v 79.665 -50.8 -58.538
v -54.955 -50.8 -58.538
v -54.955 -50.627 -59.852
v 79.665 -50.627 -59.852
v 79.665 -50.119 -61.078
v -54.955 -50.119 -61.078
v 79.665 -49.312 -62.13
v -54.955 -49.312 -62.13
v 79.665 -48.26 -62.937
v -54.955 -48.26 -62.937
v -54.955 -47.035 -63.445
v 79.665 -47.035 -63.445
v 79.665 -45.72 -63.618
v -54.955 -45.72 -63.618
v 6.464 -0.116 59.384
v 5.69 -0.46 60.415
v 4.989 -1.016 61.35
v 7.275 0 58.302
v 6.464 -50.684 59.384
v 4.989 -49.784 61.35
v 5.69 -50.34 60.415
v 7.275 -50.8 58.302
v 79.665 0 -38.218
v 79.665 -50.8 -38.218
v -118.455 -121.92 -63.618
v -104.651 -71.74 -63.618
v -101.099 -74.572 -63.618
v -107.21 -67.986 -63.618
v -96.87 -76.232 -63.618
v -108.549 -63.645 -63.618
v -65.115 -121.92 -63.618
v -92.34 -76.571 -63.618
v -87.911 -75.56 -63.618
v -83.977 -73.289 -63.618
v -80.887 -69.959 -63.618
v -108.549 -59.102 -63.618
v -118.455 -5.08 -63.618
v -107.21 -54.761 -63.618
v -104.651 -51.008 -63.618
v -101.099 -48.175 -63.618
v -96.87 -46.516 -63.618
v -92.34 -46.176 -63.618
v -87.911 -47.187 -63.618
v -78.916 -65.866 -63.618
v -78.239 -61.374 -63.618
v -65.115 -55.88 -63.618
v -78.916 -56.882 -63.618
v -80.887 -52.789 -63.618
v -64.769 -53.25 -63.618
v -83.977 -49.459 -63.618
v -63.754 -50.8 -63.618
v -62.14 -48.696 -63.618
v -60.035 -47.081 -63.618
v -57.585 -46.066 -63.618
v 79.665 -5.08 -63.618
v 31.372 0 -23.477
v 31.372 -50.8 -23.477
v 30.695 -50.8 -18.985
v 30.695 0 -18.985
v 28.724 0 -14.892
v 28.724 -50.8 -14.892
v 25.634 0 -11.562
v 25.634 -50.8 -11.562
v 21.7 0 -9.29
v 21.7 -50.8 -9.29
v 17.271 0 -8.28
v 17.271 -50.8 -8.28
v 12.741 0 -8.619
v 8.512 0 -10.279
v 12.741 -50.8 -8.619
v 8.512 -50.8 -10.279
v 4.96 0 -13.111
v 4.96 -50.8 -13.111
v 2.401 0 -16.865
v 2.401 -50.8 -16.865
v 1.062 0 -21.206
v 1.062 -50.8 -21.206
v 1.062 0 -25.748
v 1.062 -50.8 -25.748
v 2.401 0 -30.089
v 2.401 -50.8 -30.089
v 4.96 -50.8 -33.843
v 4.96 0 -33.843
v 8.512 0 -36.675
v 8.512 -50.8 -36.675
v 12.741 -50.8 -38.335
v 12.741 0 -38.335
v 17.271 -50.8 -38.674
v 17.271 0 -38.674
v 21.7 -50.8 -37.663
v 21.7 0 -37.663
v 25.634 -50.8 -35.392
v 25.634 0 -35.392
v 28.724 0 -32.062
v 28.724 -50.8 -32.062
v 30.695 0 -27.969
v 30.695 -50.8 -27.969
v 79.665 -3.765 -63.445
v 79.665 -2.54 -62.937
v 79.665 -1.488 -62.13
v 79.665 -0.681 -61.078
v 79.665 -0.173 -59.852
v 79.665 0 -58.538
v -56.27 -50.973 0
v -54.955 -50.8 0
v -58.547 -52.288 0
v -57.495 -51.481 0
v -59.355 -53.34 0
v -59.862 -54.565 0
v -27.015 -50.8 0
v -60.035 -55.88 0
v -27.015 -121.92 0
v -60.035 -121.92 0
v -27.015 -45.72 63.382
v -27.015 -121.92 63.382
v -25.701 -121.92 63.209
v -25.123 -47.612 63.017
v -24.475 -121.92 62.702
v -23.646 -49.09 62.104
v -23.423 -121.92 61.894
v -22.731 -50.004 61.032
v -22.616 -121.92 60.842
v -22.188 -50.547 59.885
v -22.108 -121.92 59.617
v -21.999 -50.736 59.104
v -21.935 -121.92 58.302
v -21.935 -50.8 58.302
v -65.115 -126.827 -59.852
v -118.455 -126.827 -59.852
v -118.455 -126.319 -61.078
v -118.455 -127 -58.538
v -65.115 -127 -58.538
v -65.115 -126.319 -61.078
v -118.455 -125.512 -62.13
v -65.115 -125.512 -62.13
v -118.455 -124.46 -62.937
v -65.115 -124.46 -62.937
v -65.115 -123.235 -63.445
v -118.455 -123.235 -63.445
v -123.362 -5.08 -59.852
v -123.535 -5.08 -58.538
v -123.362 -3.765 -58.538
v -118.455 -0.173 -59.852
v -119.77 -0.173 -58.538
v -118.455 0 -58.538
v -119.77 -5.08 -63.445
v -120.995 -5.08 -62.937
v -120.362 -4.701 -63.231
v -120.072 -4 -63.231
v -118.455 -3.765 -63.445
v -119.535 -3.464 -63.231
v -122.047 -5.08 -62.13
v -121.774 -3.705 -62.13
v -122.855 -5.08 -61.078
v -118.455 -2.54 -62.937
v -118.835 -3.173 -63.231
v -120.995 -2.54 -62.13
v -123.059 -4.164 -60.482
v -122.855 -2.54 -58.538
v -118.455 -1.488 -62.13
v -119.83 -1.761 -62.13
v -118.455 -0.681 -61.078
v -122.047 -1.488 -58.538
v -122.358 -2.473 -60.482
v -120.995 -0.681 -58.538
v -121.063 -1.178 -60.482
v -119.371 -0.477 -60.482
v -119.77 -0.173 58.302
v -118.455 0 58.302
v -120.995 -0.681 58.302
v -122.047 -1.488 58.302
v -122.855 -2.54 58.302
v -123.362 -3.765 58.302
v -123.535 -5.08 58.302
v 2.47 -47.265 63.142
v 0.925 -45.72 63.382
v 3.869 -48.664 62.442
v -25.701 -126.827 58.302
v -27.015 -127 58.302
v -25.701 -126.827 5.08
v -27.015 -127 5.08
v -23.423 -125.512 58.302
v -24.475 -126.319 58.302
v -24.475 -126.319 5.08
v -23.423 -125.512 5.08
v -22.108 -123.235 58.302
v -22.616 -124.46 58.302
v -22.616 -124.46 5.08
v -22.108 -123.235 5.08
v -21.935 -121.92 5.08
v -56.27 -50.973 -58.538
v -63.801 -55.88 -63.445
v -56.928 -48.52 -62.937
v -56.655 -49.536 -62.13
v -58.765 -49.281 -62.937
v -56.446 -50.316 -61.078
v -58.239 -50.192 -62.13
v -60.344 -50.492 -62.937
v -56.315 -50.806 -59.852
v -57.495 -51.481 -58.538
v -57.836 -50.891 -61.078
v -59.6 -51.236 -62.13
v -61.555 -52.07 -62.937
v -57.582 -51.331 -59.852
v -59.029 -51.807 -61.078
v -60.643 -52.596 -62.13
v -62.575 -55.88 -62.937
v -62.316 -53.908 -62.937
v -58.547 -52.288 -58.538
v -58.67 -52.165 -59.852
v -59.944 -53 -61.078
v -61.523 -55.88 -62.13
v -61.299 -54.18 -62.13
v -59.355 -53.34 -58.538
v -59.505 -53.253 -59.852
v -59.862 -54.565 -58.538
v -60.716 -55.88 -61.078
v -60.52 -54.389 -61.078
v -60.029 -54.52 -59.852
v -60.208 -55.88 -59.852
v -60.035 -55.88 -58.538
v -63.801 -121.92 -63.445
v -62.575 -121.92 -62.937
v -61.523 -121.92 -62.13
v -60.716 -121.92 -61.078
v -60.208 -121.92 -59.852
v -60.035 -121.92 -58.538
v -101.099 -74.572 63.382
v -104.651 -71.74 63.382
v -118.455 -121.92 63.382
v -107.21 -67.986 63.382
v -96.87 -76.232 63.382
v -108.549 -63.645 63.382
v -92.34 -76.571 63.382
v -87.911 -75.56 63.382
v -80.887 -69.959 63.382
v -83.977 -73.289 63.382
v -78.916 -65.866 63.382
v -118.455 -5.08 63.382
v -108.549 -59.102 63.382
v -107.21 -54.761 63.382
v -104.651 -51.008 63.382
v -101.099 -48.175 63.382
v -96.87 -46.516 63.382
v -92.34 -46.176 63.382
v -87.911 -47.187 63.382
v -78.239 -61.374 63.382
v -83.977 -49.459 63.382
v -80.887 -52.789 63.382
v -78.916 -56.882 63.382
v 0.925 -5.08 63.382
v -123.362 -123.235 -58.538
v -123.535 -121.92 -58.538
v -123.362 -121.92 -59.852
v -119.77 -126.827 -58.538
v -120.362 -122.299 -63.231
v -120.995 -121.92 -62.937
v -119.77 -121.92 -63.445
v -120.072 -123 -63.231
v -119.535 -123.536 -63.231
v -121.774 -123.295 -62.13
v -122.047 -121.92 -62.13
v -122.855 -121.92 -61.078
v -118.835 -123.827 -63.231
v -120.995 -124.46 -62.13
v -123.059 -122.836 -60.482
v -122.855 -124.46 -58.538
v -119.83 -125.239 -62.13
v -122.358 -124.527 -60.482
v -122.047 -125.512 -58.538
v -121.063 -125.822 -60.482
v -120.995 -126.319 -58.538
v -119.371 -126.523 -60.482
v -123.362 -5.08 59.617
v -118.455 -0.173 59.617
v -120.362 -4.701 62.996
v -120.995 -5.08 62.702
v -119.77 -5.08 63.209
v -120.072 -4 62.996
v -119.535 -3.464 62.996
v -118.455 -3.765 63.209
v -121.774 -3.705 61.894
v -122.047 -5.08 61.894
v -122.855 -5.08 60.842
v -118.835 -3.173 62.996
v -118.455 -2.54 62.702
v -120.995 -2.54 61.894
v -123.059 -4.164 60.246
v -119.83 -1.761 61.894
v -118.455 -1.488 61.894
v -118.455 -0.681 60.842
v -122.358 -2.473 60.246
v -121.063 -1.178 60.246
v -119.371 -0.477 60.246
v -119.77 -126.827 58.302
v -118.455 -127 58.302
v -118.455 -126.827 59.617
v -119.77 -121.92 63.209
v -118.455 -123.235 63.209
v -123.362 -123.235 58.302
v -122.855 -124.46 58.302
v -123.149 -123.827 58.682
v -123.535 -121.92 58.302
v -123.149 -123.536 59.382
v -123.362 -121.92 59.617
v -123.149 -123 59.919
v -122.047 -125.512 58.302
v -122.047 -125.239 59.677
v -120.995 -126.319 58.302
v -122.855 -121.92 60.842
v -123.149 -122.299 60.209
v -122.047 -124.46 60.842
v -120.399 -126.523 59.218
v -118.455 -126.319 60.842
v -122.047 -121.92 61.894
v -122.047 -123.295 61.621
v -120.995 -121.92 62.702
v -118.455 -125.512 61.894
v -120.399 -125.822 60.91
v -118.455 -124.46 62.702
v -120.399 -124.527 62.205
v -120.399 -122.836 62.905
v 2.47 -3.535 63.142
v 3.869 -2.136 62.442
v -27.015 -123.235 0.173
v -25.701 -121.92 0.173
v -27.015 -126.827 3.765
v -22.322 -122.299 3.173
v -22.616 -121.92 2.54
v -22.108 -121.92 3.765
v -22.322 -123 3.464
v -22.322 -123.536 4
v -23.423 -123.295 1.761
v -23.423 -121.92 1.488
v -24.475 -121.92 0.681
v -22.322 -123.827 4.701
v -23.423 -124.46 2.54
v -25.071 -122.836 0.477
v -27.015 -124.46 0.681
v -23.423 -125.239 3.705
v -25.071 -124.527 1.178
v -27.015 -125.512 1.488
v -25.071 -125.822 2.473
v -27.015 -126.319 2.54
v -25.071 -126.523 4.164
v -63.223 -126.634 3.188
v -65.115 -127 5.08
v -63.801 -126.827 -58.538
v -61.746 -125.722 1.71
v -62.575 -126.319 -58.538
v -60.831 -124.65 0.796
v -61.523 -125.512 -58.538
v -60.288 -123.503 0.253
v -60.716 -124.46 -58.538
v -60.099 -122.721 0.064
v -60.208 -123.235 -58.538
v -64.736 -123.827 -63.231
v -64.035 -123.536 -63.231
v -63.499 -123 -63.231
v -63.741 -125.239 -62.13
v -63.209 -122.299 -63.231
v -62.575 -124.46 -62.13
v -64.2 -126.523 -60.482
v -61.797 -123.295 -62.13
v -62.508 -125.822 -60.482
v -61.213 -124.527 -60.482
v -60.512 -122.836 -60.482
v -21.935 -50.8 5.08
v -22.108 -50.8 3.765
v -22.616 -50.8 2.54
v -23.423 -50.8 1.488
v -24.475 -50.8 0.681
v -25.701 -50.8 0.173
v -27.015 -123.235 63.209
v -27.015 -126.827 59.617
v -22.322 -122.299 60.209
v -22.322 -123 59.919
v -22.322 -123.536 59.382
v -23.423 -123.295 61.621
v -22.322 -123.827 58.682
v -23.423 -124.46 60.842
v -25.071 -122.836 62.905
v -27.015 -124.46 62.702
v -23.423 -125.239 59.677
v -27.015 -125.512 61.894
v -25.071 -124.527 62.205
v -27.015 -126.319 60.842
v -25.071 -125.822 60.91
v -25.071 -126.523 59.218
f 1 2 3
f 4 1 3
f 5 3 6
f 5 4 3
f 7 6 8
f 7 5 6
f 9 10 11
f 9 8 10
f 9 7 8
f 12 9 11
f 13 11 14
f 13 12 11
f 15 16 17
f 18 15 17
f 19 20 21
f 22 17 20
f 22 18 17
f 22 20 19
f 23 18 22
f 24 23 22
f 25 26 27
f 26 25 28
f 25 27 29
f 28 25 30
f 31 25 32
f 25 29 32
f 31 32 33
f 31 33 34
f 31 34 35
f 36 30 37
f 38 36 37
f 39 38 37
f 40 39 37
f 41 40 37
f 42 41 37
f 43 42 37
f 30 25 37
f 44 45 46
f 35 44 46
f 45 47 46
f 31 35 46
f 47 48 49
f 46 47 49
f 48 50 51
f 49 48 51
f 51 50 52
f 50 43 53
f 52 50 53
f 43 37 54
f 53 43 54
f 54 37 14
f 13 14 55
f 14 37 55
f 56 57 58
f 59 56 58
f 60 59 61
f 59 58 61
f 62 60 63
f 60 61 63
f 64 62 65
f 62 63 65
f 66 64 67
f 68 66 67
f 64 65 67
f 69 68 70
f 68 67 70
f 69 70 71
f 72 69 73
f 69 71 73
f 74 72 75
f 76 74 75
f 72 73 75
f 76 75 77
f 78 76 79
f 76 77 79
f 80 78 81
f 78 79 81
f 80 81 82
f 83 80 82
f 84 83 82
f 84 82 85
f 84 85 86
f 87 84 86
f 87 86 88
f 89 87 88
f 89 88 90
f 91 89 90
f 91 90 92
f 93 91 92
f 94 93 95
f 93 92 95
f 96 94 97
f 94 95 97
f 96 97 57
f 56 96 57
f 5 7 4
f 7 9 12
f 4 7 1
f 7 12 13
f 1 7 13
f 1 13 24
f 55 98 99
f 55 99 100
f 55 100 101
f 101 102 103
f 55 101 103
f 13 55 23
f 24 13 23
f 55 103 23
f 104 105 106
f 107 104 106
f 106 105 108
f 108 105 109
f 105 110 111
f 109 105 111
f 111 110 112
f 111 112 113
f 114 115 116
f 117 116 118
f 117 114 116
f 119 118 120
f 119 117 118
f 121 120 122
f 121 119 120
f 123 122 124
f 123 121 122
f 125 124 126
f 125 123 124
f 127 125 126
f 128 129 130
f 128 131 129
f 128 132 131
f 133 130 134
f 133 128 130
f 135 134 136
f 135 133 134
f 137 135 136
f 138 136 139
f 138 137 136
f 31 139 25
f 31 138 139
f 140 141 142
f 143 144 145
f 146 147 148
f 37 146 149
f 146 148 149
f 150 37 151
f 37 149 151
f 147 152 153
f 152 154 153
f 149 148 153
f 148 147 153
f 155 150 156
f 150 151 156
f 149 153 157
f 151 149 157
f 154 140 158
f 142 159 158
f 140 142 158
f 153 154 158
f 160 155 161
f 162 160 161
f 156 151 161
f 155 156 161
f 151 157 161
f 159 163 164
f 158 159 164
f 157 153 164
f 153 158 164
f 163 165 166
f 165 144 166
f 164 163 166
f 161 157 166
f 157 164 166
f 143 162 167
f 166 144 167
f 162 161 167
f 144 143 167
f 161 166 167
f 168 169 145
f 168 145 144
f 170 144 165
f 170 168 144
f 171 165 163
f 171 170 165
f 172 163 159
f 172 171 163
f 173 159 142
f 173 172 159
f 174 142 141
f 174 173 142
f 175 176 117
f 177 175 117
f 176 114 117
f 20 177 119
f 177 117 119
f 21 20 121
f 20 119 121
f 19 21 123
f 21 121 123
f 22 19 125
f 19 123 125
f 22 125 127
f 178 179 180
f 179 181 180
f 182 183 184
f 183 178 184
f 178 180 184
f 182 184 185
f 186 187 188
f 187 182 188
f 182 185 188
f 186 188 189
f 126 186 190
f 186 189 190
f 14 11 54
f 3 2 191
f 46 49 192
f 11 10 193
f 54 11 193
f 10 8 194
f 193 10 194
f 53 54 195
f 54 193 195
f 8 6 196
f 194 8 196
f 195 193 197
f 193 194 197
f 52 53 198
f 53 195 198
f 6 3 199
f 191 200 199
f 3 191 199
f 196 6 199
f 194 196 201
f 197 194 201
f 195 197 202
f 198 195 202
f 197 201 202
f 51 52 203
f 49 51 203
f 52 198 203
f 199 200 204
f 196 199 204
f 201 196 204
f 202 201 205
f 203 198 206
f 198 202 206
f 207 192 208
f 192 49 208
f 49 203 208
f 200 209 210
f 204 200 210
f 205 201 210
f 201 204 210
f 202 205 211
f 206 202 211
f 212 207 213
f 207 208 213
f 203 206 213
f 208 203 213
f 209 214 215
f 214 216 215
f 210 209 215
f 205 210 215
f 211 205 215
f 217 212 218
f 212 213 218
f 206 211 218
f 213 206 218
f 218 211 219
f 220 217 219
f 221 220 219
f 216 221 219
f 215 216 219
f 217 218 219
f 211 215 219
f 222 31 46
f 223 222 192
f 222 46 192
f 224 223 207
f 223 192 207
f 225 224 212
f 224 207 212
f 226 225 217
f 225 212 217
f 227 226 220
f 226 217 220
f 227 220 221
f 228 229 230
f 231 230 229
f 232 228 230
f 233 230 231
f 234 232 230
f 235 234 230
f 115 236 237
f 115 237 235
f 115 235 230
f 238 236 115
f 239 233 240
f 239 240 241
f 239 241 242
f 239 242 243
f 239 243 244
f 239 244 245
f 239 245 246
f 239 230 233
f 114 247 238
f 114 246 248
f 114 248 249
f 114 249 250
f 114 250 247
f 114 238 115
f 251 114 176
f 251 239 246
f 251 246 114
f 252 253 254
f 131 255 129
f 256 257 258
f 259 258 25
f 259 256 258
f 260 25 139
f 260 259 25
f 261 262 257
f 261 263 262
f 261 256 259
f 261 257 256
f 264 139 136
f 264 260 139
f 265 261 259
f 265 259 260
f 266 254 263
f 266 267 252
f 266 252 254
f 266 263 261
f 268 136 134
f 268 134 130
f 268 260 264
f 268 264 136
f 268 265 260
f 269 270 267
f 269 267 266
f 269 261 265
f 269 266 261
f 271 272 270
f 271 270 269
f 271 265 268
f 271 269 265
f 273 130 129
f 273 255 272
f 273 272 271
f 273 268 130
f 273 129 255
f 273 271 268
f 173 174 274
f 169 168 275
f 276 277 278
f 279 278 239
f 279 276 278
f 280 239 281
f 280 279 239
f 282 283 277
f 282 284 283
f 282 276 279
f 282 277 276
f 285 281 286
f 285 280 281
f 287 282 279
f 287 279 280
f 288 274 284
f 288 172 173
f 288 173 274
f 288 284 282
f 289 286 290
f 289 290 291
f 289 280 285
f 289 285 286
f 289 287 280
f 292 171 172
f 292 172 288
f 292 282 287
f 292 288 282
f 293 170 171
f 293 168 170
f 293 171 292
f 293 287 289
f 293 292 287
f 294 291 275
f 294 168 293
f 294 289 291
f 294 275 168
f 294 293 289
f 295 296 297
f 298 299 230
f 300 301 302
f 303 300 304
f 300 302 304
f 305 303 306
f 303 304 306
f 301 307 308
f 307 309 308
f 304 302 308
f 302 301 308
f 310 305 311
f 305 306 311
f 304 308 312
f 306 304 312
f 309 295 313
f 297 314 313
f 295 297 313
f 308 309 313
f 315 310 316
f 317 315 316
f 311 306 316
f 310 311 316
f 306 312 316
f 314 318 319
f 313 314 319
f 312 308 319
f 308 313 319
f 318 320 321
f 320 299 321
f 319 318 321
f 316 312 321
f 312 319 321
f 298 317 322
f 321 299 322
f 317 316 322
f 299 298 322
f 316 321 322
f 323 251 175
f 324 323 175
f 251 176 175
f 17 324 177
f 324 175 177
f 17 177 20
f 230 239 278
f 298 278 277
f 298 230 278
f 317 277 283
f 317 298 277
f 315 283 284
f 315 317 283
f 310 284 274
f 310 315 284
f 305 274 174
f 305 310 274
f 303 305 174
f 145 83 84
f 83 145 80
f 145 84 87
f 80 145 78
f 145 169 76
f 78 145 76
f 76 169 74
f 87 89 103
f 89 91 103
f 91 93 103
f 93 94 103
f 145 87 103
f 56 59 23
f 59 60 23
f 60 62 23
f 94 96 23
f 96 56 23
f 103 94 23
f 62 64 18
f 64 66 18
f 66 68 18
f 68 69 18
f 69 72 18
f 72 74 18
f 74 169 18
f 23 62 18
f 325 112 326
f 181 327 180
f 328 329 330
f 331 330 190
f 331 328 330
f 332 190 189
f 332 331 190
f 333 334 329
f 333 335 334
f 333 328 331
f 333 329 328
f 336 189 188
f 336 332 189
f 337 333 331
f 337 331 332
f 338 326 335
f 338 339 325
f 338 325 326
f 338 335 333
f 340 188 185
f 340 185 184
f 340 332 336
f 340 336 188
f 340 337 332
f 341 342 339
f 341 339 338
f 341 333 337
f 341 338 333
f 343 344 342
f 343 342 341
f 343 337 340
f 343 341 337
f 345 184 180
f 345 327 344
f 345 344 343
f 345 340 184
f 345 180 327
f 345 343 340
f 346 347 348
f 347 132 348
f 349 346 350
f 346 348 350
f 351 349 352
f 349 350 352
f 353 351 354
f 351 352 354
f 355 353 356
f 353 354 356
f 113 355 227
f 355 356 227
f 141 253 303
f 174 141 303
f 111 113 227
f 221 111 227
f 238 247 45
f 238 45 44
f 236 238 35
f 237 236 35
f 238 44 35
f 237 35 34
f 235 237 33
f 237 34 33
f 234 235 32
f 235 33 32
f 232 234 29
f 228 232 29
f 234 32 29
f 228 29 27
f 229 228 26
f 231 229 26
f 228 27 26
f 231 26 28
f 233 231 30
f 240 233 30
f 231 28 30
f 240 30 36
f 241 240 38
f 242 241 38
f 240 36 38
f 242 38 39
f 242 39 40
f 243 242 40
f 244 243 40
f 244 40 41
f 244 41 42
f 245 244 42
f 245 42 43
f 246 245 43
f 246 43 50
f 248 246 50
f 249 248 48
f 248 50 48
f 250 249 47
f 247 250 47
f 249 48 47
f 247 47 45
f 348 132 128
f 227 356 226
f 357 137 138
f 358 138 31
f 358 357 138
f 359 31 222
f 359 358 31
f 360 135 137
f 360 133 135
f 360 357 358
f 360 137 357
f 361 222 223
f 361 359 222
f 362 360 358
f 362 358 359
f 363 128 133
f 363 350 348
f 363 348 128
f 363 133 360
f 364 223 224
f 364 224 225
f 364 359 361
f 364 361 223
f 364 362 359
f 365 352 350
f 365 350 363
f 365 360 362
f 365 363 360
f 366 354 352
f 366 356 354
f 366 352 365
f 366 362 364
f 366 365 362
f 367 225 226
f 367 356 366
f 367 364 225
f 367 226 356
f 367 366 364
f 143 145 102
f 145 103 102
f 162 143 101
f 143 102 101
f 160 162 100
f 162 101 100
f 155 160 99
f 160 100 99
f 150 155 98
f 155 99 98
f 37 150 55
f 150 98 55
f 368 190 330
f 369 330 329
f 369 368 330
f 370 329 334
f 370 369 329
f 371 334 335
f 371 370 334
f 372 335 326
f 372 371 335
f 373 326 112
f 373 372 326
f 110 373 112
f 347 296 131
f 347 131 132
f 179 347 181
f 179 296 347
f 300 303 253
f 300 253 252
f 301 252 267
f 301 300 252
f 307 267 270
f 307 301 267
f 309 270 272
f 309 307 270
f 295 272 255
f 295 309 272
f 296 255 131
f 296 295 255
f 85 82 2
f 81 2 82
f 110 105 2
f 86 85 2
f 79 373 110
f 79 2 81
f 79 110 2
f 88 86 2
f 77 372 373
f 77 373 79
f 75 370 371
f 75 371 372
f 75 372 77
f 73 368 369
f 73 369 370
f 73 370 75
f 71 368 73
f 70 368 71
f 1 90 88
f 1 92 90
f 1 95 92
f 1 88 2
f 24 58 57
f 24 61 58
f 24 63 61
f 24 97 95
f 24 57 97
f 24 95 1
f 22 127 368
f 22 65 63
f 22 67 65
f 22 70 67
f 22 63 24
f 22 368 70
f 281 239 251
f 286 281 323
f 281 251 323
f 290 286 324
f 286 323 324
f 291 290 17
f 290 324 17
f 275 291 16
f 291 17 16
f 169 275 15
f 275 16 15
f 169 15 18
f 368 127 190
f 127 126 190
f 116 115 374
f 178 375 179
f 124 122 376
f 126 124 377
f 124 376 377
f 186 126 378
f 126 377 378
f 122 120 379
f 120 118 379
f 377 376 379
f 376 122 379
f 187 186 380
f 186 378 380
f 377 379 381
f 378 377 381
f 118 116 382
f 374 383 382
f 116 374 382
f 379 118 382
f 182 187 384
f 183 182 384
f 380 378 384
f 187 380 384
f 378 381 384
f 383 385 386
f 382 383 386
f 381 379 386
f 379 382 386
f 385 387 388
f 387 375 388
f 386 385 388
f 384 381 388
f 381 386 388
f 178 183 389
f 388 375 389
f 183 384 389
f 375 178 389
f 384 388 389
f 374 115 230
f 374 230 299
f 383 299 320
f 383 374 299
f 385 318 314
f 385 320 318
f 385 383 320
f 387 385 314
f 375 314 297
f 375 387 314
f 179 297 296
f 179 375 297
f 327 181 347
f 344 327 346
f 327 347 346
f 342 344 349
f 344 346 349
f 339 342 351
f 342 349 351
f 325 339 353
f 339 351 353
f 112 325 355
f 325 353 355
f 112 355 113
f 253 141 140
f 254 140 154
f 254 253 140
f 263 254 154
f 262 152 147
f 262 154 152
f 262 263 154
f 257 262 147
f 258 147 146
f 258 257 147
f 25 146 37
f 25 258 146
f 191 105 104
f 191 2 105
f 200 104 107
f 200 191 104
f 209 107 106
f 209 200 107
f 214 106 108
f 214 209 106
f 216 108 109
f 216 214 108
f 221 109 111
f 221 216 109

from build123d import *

# Parameters (mm, degrees)
F0_W     = 203.2
F0_H     = 127
F1_DEPTH = 127
F3_DEPTH = 76.2
F4_SIZE2 = 101.6
F4_SIZE  = 76.2
F5_R     = 5.08
F6_R     = 15.24
F7_DEPTH = 50.8
F8_R     = 15.24
F9_DEPTH = 127


with BuildPart() as f1:
    # F0 (on Front) → F1 (new body)
    with BuildSketch(Plane.XZ):
        with Locations((-21.9353889487, -0.1176632941)):
            Rectangle(F0_W, F0_H)
    extrude(amount=F1_DEPTH)

    # F2 (on face) → F3 (cut)
    with BuildSketch(Plane.XZ.offset(127)):
        Polygon((79.6646110513, 63.3823367059), (-21.9353889487, 63.3823367059), (-21.9353889487, 0), (-60.0353889487, 0), (-60.0353889487, -63.6176632941), (79.6646110513, -63.6176632941), align=None)
    extrude(amount=-F3_DEPTH, mode=Mode.SUBTRACT)

    # F4
    f4_edges = [f1.edges().sort_by_distance(p)[0] for p in [
        (79.664611, -25.4, 63.382337),
    ]]
    f4_side = f1.faces().sort_by_distance((-43.706818, -52.614286, 63.382337))[0]
    chamfer(f4_edges, length=F4_SIZE, length2=F4_SIZE2, reference=f4_side)

    # F5
    f5_edges = [f1.edges().sort_by_distance(p)[0] for p in [
        (-72.735389, -127, 63.382337),
        (-21.935389, -88.9, 63.382337),
        (-40.985389, -127, 0),
        (-21.935389, -88.9, 0),
        (-21.935389, -127, 31.691168),
        (-60.035389, -127, -31.808832),
        (-60.035389, -50.8, -31.808832),
        (9.814611, -50.8, -63.617663),
        (3.464611, -25.4, 63.382337),
        (-9.235389, -50.8, 63.382337),
        (-123.535389, -127, -0.117663),
        (-123.535389, 0, -0.117663),
        (-123.535389, -63.5, -63.617663),
        (-123.535389, -63.5, 63.382337),
        (-21.935389, 0, -63.617663),
        (-60.035389, 0, 63.382337),
        (-91.785389, -127, -63.617663),
        (-60.035389, -88.9, -63.617663),
    ]]
    fillet(f5_edges, radius=F5_R)

    # F6 (on face) → F7 (cut, through all)
    with BuildSketch(Plane.XZ.offset(50.8)):
        with Locations((16.1317326128, -23.4769377857)):
            Circle(F6_R)
    extrude(amount=-F7_DEPTH, mode=Mode.SUBTRACT)

    # F8 (on face) → F9 (cut, through all)
    with BuildSketch(Plane(origin=(0, 0, -63.6176632941), x_dir=(1, 0, 0), z_dir=(0, 0, -1))):
        with Locations((-93.4789702296, 61.3736882806)):
            Circle(F8_R)
    extrude(amount=-F9_DEPTH, mode=Mode.SUBTRACT)


solid = f1.part
